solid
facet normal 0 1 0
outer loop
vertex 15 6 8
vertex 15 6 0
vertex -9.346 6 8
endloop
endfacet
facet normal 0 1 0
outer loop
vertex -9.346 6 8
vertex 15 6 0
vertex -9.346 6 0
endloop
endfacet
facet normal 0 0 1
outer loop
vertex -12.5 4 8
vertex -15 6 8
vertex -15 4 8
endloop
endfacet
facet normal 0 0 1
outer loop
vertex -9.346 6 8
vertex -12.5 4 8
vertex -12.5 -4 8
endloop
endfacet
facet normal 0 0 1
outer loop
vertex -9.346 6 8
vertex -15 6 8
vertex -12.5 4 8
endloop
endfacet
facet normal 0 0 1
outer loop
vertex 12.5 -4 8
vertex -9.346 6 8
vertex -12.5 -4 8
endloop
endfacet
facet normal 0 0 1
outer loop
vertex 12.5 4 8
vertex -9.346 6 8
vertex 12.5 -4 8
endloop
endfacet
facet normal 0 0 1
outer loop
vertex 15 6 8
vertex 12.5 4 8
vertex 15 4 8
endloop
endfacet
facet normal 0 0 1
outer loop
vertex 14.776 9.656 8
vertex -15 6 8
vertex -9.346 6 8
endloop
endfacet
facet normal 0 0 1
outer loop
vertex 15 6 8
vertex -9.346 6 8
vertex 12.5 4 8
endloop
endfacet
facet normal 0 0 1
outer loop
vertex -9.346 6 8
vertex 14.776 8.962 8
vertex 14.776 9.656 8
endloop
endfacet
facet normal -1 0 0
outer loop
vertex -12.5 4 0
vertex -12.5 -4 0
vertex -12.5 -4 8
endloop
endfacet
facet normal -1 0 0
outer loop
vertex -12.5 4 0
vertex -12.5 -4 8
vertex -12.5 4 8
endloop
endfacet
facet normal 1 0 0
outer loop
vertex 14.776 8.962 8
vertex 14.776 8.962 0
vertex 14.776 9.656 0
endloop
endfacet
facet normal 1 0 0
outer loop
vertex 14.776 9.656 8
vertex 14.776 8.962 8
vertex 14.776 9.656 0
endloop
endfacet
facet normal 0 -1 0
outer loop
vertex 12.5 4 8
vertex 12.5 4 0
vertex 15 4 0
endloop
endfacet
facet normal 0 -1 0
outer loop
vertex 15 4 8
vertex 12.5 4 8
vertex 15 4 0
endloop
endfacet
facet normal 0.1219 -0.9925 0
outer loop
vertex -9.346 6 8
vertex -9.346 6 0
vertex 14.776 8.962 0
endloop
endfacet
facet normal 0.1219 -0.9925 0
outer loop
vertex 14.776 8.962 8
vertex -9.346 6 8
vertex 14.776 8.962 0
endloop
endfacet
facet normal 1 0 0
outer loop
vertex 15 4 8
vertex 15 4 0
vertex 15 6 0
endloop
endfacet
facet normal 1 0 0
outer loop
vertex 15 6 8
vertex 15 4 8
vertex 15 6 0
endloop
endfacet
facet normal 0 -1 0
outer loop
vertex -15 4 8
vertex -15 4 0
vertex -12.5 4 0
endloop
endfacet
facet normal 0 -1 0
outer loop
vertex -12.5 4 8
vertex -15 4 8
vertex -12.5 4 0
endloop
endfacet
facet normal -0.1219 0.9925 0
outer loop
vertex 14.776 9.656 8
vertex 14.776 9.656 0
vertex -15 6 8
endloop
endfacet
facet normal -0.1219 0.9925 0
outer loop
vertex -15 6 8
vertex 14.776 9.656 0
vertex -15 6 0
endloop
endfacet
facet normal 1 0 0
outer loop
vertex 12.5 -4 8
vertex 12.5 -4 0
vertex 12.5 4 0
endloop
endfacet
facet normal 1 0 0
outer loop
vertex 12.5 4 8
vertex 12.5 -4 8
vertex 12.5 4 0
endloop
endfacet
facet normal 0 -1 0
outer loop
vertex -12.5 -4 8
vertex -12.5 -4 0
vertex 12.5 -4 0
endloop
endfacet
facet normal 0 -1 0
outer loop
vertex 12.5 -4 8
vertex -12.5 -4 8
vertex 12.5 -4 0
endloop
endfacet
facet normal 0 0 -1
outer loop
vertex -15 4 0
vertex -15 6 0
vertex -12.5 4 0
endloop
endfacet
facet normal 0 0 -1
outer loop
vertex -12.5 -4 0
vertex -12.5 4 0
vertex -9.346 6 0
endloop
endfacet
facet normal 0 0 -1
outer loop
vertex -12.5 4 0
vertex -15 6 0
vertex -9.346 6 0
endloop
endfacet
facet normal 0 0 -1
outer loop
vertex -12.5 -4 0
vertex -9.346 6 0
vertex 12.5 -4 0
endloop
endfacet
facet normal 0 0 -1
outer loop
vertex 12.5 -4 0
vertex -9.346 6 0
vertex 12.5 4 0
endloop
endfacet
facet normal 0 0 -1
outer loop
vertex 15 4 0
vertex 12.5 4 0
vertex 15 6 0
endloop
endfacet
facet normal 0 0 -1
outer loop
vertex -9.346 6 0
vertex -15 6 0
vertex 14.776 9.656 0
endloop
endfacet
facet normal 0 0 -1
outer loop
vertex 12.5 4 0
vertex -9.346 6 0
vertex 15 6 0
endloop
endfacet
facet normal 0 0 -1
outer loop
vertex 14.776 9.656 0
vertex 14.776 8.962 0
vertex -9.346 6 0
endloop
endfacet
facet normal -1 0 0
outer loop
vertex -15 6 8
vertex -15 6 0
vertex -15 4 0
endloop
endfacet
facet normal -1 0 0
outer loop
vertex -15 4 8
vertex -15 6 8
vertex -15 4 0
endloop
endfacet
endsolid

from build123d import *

# Parameters (mm, degrees)
SKETCH1_W           = 25
SKETCH1_H           = 8
BOSS_EXTRUDE1_DEPTH = 8


with BuildPart() as part:
    # Sketch1 → Boss-Extrude1 (new body)
    with BuildSketch(Plane.XY):
        Polygon((14.776384549, 9.656080302), (-15, 6), (-9.346191937, 6), (14.776384549, 8.961879962), align=None)
        Polygon((-9.346191937, 6), (-15, 6), (-15, 4), (-12.5, 4), (12.5, 4), (15, 4), (15, 6), align=None)
        Rectangle(SKETCH1_W, SKETCH1_H)
    extrude(amount=BOSS_EXTRUDE1_DEPTH)


solid = part.part
